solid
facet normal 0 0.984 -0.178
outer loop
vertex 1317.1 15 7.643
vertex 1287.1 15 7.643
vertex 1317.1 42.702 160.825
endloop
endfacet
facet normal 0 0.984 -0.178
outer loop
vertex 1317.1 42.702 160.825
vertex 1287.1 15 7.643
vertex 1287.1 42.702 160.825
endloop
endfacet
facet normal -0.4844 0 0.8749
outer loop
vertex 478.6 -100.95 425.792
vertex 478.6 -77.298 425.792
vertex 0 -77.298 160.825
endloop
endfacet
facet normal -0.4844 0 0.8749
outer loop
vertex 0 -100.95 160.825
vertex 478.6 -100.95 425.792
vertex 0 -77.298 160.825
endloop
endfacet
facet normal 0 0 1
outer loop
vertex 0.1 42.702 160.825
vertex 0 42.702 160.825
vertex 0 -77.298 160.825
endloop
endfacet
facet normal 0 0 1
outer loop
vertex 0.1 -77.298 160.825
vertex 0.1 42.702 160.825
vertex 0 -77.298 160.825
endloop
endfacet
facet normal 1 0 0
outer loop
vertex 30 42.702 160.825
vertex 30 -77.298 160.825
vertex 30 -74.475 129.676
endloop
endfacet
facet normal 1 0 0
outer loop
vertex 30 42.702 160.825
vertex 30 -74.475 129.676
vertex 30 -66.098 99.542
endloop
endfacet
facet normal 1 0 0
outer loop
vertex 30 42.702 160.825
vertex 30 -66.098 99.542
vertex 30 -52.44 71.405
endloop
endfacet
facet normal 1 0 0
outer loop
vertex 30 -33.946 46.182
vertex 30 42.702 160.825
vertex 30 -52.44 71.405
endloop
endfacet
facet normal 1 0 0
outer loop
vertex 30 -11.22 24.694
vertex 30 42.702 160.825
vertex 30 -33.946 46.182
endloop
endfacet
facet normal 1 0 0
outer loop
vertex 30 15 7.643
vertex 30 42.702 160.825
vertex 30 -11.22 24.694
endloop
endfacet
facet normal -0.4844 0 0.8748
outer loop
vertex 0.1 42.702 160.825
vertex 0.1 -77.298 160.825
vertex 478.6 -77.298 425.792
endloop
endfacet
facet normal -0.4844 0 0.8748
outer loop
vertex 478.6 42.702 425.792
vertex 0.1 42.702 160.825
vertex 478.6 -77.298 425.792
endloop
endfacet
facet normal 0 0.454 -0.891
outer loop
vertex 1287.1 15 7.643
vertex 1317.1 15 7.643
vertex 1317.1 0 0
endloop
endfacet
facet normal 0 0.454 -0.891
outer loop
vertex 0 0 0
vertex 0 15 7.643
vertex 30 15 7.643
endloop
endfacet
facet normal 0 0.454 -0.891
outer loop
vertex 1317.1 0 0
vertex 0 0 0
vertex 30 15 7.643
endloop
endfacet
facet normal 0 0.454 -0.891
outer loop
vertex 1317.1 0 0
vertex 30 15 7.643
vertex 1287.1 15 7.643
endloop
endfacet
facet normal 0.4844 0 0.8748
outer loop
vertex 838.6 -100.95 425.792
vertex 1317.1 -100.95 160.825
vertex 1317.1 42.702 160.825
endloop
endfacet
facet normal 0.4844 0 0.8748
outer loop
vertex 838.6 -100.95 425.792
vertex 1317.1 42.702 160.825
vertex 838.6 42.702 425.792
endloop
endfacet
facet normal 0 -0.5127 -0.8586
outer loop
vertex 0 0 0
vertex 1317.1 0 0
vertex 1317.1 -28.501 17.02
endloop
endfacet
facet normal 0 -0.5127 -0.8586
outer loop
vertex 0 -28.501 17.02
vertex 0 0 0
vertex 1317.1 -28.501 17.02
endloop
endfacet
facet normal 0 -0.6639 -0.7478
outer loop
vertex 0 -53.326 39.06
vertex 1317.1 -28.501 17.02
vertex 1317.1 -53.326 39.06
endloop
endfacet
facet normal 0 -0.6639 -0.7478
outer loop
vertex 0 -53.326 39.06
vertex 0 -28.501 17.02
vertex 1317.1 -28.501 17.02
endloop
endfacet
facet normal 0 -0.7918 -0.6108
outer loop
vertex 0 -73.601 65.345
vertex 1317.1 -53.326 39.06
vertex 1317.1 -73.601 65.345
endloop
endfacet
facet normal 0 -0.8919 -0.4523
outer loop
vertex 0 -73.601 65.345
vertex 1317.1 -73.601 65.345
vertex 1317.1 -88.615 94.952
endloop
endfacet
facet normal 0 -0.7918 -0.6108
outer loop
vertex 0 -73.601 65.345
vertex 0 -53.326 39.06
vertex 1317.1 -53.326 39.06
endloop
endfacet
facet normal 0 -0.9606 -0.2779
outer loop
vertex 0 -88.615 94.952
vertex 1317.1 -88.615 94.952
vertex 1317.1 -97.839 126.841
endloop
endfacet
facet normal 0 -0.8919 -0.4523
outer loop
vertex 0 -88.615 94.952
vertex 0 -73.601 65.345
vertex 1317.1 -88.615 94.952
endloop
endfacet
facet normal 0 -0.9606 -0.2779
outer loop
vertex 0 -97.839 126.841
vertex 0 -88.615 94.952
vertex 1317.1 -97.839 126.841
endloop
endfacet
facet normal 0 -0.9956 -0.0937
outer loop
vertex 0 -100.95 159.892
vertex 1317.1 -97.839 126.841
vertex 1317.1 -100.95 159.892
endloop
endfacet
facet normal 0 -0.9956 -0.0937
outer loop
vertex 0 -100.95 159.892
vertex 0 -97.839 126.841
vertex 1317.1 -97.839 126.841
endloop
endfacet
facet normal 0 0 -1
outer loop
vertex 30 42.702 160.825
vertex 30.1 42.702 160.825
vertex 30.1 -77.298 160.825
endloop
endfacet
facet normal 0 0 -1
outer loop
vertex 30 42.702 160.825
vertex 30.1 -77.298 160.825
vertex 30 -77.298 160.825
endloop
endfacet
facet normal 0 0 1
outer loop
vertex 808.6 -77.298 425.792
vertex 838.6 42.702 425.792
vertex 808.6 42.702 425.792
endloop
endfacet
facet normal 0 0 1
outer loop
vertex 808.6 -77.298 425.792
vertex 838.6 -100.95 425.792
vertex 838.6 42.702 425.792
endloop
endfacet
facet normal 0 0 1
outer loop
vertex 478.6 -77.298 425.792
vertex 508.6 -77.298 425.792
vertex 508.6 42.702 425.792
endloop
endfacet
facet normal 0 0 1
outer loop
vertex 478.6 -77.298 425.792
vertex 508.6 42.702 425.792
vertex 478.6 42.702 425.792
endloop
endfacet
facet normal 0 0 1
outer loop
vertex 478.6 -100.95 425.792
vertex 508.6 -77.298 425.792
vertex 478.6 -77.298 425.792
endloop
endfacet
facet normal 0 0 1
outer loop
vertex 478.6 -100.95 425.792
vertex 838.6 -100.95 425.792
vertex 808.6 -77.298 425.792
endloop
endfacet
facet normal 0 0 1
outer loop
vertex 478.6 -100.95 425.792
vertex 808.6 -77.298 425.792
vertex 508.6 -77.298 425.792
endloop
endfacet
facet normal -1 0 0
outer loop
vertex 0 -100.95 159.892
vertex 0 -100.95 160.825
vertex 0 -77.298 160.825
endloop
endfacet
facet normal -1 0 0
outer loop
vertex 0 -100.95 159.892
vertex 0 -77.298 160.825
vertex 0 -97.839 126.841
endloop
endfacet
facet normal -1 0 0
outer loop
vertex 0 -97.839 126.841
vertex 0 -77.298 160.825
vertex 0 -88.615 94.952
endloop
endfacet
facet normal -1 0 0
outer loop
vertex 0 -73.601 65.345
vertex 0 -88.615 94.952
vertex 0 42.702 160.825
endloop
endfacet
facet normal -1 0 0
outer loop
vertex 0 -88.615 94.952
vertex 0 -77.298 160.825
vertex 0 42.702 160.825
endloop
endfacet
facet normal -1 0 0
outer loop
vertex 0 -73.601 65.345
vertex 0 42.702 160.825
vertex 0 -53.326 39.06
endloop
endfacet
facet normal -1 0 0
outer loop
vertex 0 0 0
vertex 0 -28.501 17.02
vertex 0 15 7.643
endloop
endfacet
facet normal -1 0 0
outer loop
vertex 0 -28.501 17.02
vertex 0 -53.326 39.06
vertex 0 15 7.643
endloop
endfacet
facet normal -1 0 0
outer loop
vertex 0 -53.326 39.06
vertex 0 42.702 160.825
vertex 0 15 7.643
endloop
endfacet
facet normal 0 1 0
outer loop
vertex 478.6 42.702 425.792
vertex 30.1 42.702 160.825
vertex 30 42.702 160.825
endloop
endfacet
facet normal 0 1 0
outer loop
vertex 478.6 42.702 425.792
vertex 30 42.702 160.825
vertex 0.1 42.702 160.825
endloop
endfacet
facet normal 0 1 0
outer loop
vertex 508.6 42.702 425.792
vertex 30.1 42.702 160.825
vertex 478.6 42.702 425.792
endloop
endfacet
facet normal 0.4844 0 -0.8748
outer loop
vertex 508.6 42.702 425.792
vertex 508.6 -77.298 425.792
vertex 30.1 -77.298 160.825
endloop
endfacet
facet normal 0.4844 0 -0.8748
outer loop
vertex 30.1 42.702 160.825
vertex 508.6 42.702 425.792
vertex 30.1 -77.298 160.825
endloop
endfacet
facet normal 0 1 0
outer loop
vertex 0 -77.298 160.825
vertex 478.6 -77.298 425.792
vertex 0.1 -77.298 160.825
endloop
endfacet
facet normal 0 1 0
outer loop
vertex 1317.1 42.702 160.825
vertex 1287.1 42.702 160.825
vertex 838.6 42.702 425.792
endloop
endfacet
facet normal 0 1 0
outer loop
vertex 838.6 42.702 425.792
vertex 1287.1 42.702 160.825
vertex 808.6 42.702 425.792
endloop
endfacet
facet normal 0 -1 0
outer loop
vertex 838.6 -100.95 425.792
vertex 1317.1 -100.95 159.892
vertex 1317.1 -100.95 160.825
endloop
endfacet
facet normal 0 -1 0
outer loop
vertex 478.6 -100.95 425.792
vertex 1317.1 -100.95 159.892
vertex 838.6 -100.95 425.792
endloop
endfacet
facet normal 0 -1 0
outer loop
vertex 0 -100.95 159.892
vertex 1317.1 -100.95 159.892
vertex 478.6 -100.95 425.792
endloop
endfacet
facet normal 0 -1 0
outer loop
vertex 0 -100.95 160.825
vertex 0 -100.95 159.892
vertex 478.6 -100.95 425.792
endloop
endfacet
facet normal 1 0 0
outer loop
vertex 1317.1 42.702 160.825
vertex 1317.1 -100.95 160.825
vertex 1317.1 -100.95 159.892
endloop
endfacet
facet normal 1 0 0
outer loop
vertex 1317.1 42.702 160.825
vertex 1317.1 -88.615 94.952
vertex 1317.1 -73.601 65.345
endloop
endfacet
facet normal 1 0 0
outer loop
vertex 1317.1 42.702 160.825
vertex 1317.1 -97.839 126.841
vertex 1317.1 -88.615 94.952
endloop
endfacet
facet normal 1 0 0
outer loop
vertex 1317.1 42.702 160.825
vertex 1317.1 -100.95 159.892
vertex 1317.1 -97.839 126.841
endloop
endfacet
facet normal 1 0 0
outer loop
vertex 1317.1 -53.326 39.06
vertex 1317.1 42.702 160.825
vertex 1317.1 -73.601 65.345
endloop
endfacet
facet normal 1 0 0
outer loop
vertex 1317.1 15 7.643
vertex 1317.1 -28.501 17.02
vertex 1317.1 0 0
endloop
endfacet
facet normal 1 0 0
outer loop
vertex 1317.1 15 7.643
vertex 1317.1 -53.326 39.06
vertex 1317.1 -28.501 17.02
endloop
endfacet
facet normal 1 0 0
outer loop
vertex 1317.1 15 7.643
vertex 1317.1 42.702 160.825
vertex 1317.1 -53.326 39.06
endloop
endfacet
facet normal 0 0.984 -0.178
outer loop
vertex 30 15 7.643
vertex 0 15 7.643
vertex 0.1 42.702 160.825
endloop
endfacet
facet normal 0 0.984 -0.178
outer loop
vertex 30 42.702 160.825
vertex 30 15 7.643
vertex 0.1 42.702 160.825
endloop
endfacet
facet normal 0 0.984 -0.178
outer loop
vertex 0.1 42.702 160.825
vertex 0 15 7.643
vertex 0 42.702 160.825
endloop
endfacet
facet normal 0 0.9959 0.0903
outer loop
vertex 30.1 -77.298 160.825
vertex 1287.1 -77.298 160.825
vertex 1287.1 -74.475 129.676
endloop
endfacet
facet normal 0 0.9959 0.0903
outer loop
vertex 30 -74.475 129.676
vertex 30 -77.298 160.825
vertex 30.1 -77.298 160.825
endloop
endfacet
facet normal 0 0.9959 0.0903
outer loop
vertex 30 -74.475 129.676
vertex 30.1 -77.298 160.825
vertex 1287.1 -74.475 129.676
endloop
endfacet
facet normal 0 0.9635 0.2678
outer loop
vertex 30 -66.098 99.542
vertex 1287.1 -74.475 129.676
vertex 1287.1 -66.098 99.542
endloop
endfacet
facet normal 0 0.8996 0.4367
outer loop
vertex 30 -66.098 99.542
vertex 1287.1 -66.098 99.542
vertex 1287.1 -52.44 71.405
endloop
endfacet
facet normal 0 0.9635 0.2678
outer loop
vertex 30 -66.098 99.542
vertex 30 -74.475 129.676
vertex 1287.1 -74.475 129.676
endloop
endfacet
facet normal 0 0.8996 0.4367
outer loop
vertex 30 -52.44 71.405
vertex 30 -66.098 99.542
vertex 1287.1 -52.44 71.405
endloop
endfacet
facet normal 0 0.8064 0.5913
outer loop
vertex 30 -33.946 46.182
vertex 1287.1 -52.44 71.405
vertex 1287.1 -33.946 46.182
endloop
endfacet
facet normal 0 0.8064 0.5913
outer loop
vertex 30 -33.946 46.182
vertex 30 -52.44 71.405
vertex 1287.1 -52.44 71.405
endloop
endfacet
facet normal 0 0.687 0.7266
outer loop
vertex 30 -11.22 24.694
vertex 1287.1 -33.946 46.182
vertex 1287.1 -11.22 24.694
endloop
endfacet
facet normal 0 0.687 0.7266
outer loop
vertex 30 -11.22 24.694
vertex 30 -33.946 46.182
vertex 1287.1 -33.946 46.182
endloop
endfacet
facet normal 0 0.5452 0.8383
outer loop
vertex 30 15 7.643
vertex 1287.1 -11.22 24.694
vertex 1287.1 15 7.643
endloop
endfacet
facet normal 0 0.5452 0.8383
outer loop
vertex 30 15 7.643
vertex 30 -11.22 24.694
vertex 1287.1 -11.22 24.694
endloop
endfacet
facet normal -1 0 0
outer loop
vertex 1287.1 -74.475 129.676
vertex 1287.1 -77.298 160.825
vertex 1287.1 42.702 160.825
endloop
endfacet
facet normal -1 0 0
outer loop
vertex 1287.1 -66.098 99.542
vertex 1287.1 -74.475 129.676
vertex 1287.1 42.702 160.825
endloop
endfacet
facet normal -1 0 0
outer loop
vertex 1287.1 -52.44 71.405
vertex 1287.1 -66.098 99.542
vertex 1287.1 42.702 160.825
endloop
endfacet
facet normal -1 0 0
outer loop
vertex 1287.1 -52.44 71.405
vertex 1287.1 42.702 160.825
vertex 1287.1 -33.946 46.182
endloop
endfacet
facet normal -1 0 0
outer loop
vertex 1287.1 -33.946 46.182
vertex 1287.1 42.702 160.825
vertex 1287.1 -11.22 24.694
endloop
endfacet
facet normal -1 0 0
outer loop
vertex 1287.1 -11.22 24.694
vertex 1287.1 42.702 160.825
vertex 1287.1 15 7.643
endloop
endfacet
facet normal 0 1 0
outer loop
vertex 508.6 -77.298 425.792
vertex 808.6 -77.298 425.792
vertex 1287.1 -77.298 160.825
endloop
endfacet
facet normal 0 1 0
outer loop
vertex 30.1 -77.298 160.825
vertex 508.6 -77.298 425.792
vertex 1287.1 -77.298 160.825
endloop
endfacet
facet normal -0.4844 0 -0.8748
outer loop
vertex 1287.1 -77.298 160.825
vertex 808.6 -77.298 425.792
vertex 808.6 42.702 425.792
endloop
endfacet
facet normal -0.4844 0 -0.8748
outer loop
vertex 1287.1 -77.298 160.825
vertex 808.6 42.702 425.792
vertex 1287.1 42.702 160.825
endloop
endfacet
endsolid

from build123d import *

# Parameters (mm, degrees)
BOSS_EXTRUDE1_DEPTH = 1317.1
CUT_EXTRUDE3_DEPTH  = 1388.288687357
BOSS_EXTRUDE5_DEPTH = 120
BOSS_EXTRUDE6_DEPTH = 30
BOSS_EXTRUDE7_START = -30
BOSS_EXTRUDE7_DEPTH = 30


with BuildPart() as part:
    # Sketch4 → Boss-Extrude1 (new body)
    with BuildSketch(Plane(origin=(0, 0, 0), x_dir=(0, 0, -1), z_dir=(1, 0, 0))):
        with BuildLine():
            Line((-159.891789037, -100.950379886), (-425.791789037, -100.950379886))
            Line((-425.791789037, -100.950379886), (-425.791789037, -77.297586412))
            Line((-425.791789037, -77.297586412), (-160.824878808, -77.297586412))
            ThreePointArc((-160.824878808, -77.297586412), (-71.405126121, -52.440077817), (-7.642881742, 15))
            Line((-7.642881742, 15), (0, 0))
            ThreePointArc((0, 0), (-65.345023624, -73.601000579), (-159.891789037, -100.950379886))
        make_face()
    extrude(amount=BOSS_EXTRUDE1_DEPTH)

    # Sketch10 → Cut-Extrude3 (cut, through all)
    with BuildSketch(Plane(origin=(0, -77.297586412, 0), x_dir=(1, 0, 0), z_dir=(0, 1, 0))):
        Polygon((0, -425.791789037), (478.6, -425.791789037), (0, -160.824878808), align=None)
        Polygon((1317.1, -160.824878808), (838.6, -425.791789037), (1317.1, -425.791789037), align=None)
    extrude(amount=-CUT_EXTRUDE3_DEPTH, mode=Mode.SUBTRACT)

    # Sketch11 → Boss-Extrude5 (add)
    with BuildSketch(Plane(origin=(0, -77.297586412, 0), x_dir=(1, 0, 0), z_dir=(0, 1, 0))):
        Polygon((838.6, -425.791789037), (808.6, -425.791789037), (1287.1, -160.824878808), (1317.1, -160.824878808), align=None)
        Polygon((478.6, -425.791789037), (508.6, -425.791789037), (30.1, -160.824878808), (0.1, -160.824878808), align=None)
    extrude(amount=BOSS_EXTRUDE5_DEPTH)

    # Sketch13 → Boss-Extrude6 (add)
    with BuildSketch(Plane(origin=(0, 0, 0), x_dir=(0, 0, -1), z_dir=(1, 0, 0))):
        with BuildLine():
            Line((-7.642881742, 15), (-160.824878808, 42.702413588))
            Line((-160.824878808, 42.702413588), (-160.824878808, -77.297586412))
            ThreePointArc((-160.824878808, -77.297586412), (-71.405126121, -52.440077817), (-7.642881742, 15))
        make_face()
    extrude(amount=BOSS_EXTRUDE6_DEPTH)

    # Sketch12 → Boss-Extrude7 (add)
    with BuildSketch(Plane(origin=(1317.1, 0, 0), x_dir=(0, 0, -1), z_dir=(1, 0, 0)).offset(BOSS_EXTRUDE7_START)):
        with BuildLine():
            Line((-7.642881742, 15), (-160.824878808, 42.702413588))
            Line((-160.824878808, 42.702413588), (-160.824878808, -77.297586412))
            ThreePointArc((-160.824878808, -77.297586412), (-71.405126121, -52.440077817), (-7.642881742, 15))
        make_face()
    extrude(amount=BOSS_EXTRUDE7_DEPTH)


solid = part.part
